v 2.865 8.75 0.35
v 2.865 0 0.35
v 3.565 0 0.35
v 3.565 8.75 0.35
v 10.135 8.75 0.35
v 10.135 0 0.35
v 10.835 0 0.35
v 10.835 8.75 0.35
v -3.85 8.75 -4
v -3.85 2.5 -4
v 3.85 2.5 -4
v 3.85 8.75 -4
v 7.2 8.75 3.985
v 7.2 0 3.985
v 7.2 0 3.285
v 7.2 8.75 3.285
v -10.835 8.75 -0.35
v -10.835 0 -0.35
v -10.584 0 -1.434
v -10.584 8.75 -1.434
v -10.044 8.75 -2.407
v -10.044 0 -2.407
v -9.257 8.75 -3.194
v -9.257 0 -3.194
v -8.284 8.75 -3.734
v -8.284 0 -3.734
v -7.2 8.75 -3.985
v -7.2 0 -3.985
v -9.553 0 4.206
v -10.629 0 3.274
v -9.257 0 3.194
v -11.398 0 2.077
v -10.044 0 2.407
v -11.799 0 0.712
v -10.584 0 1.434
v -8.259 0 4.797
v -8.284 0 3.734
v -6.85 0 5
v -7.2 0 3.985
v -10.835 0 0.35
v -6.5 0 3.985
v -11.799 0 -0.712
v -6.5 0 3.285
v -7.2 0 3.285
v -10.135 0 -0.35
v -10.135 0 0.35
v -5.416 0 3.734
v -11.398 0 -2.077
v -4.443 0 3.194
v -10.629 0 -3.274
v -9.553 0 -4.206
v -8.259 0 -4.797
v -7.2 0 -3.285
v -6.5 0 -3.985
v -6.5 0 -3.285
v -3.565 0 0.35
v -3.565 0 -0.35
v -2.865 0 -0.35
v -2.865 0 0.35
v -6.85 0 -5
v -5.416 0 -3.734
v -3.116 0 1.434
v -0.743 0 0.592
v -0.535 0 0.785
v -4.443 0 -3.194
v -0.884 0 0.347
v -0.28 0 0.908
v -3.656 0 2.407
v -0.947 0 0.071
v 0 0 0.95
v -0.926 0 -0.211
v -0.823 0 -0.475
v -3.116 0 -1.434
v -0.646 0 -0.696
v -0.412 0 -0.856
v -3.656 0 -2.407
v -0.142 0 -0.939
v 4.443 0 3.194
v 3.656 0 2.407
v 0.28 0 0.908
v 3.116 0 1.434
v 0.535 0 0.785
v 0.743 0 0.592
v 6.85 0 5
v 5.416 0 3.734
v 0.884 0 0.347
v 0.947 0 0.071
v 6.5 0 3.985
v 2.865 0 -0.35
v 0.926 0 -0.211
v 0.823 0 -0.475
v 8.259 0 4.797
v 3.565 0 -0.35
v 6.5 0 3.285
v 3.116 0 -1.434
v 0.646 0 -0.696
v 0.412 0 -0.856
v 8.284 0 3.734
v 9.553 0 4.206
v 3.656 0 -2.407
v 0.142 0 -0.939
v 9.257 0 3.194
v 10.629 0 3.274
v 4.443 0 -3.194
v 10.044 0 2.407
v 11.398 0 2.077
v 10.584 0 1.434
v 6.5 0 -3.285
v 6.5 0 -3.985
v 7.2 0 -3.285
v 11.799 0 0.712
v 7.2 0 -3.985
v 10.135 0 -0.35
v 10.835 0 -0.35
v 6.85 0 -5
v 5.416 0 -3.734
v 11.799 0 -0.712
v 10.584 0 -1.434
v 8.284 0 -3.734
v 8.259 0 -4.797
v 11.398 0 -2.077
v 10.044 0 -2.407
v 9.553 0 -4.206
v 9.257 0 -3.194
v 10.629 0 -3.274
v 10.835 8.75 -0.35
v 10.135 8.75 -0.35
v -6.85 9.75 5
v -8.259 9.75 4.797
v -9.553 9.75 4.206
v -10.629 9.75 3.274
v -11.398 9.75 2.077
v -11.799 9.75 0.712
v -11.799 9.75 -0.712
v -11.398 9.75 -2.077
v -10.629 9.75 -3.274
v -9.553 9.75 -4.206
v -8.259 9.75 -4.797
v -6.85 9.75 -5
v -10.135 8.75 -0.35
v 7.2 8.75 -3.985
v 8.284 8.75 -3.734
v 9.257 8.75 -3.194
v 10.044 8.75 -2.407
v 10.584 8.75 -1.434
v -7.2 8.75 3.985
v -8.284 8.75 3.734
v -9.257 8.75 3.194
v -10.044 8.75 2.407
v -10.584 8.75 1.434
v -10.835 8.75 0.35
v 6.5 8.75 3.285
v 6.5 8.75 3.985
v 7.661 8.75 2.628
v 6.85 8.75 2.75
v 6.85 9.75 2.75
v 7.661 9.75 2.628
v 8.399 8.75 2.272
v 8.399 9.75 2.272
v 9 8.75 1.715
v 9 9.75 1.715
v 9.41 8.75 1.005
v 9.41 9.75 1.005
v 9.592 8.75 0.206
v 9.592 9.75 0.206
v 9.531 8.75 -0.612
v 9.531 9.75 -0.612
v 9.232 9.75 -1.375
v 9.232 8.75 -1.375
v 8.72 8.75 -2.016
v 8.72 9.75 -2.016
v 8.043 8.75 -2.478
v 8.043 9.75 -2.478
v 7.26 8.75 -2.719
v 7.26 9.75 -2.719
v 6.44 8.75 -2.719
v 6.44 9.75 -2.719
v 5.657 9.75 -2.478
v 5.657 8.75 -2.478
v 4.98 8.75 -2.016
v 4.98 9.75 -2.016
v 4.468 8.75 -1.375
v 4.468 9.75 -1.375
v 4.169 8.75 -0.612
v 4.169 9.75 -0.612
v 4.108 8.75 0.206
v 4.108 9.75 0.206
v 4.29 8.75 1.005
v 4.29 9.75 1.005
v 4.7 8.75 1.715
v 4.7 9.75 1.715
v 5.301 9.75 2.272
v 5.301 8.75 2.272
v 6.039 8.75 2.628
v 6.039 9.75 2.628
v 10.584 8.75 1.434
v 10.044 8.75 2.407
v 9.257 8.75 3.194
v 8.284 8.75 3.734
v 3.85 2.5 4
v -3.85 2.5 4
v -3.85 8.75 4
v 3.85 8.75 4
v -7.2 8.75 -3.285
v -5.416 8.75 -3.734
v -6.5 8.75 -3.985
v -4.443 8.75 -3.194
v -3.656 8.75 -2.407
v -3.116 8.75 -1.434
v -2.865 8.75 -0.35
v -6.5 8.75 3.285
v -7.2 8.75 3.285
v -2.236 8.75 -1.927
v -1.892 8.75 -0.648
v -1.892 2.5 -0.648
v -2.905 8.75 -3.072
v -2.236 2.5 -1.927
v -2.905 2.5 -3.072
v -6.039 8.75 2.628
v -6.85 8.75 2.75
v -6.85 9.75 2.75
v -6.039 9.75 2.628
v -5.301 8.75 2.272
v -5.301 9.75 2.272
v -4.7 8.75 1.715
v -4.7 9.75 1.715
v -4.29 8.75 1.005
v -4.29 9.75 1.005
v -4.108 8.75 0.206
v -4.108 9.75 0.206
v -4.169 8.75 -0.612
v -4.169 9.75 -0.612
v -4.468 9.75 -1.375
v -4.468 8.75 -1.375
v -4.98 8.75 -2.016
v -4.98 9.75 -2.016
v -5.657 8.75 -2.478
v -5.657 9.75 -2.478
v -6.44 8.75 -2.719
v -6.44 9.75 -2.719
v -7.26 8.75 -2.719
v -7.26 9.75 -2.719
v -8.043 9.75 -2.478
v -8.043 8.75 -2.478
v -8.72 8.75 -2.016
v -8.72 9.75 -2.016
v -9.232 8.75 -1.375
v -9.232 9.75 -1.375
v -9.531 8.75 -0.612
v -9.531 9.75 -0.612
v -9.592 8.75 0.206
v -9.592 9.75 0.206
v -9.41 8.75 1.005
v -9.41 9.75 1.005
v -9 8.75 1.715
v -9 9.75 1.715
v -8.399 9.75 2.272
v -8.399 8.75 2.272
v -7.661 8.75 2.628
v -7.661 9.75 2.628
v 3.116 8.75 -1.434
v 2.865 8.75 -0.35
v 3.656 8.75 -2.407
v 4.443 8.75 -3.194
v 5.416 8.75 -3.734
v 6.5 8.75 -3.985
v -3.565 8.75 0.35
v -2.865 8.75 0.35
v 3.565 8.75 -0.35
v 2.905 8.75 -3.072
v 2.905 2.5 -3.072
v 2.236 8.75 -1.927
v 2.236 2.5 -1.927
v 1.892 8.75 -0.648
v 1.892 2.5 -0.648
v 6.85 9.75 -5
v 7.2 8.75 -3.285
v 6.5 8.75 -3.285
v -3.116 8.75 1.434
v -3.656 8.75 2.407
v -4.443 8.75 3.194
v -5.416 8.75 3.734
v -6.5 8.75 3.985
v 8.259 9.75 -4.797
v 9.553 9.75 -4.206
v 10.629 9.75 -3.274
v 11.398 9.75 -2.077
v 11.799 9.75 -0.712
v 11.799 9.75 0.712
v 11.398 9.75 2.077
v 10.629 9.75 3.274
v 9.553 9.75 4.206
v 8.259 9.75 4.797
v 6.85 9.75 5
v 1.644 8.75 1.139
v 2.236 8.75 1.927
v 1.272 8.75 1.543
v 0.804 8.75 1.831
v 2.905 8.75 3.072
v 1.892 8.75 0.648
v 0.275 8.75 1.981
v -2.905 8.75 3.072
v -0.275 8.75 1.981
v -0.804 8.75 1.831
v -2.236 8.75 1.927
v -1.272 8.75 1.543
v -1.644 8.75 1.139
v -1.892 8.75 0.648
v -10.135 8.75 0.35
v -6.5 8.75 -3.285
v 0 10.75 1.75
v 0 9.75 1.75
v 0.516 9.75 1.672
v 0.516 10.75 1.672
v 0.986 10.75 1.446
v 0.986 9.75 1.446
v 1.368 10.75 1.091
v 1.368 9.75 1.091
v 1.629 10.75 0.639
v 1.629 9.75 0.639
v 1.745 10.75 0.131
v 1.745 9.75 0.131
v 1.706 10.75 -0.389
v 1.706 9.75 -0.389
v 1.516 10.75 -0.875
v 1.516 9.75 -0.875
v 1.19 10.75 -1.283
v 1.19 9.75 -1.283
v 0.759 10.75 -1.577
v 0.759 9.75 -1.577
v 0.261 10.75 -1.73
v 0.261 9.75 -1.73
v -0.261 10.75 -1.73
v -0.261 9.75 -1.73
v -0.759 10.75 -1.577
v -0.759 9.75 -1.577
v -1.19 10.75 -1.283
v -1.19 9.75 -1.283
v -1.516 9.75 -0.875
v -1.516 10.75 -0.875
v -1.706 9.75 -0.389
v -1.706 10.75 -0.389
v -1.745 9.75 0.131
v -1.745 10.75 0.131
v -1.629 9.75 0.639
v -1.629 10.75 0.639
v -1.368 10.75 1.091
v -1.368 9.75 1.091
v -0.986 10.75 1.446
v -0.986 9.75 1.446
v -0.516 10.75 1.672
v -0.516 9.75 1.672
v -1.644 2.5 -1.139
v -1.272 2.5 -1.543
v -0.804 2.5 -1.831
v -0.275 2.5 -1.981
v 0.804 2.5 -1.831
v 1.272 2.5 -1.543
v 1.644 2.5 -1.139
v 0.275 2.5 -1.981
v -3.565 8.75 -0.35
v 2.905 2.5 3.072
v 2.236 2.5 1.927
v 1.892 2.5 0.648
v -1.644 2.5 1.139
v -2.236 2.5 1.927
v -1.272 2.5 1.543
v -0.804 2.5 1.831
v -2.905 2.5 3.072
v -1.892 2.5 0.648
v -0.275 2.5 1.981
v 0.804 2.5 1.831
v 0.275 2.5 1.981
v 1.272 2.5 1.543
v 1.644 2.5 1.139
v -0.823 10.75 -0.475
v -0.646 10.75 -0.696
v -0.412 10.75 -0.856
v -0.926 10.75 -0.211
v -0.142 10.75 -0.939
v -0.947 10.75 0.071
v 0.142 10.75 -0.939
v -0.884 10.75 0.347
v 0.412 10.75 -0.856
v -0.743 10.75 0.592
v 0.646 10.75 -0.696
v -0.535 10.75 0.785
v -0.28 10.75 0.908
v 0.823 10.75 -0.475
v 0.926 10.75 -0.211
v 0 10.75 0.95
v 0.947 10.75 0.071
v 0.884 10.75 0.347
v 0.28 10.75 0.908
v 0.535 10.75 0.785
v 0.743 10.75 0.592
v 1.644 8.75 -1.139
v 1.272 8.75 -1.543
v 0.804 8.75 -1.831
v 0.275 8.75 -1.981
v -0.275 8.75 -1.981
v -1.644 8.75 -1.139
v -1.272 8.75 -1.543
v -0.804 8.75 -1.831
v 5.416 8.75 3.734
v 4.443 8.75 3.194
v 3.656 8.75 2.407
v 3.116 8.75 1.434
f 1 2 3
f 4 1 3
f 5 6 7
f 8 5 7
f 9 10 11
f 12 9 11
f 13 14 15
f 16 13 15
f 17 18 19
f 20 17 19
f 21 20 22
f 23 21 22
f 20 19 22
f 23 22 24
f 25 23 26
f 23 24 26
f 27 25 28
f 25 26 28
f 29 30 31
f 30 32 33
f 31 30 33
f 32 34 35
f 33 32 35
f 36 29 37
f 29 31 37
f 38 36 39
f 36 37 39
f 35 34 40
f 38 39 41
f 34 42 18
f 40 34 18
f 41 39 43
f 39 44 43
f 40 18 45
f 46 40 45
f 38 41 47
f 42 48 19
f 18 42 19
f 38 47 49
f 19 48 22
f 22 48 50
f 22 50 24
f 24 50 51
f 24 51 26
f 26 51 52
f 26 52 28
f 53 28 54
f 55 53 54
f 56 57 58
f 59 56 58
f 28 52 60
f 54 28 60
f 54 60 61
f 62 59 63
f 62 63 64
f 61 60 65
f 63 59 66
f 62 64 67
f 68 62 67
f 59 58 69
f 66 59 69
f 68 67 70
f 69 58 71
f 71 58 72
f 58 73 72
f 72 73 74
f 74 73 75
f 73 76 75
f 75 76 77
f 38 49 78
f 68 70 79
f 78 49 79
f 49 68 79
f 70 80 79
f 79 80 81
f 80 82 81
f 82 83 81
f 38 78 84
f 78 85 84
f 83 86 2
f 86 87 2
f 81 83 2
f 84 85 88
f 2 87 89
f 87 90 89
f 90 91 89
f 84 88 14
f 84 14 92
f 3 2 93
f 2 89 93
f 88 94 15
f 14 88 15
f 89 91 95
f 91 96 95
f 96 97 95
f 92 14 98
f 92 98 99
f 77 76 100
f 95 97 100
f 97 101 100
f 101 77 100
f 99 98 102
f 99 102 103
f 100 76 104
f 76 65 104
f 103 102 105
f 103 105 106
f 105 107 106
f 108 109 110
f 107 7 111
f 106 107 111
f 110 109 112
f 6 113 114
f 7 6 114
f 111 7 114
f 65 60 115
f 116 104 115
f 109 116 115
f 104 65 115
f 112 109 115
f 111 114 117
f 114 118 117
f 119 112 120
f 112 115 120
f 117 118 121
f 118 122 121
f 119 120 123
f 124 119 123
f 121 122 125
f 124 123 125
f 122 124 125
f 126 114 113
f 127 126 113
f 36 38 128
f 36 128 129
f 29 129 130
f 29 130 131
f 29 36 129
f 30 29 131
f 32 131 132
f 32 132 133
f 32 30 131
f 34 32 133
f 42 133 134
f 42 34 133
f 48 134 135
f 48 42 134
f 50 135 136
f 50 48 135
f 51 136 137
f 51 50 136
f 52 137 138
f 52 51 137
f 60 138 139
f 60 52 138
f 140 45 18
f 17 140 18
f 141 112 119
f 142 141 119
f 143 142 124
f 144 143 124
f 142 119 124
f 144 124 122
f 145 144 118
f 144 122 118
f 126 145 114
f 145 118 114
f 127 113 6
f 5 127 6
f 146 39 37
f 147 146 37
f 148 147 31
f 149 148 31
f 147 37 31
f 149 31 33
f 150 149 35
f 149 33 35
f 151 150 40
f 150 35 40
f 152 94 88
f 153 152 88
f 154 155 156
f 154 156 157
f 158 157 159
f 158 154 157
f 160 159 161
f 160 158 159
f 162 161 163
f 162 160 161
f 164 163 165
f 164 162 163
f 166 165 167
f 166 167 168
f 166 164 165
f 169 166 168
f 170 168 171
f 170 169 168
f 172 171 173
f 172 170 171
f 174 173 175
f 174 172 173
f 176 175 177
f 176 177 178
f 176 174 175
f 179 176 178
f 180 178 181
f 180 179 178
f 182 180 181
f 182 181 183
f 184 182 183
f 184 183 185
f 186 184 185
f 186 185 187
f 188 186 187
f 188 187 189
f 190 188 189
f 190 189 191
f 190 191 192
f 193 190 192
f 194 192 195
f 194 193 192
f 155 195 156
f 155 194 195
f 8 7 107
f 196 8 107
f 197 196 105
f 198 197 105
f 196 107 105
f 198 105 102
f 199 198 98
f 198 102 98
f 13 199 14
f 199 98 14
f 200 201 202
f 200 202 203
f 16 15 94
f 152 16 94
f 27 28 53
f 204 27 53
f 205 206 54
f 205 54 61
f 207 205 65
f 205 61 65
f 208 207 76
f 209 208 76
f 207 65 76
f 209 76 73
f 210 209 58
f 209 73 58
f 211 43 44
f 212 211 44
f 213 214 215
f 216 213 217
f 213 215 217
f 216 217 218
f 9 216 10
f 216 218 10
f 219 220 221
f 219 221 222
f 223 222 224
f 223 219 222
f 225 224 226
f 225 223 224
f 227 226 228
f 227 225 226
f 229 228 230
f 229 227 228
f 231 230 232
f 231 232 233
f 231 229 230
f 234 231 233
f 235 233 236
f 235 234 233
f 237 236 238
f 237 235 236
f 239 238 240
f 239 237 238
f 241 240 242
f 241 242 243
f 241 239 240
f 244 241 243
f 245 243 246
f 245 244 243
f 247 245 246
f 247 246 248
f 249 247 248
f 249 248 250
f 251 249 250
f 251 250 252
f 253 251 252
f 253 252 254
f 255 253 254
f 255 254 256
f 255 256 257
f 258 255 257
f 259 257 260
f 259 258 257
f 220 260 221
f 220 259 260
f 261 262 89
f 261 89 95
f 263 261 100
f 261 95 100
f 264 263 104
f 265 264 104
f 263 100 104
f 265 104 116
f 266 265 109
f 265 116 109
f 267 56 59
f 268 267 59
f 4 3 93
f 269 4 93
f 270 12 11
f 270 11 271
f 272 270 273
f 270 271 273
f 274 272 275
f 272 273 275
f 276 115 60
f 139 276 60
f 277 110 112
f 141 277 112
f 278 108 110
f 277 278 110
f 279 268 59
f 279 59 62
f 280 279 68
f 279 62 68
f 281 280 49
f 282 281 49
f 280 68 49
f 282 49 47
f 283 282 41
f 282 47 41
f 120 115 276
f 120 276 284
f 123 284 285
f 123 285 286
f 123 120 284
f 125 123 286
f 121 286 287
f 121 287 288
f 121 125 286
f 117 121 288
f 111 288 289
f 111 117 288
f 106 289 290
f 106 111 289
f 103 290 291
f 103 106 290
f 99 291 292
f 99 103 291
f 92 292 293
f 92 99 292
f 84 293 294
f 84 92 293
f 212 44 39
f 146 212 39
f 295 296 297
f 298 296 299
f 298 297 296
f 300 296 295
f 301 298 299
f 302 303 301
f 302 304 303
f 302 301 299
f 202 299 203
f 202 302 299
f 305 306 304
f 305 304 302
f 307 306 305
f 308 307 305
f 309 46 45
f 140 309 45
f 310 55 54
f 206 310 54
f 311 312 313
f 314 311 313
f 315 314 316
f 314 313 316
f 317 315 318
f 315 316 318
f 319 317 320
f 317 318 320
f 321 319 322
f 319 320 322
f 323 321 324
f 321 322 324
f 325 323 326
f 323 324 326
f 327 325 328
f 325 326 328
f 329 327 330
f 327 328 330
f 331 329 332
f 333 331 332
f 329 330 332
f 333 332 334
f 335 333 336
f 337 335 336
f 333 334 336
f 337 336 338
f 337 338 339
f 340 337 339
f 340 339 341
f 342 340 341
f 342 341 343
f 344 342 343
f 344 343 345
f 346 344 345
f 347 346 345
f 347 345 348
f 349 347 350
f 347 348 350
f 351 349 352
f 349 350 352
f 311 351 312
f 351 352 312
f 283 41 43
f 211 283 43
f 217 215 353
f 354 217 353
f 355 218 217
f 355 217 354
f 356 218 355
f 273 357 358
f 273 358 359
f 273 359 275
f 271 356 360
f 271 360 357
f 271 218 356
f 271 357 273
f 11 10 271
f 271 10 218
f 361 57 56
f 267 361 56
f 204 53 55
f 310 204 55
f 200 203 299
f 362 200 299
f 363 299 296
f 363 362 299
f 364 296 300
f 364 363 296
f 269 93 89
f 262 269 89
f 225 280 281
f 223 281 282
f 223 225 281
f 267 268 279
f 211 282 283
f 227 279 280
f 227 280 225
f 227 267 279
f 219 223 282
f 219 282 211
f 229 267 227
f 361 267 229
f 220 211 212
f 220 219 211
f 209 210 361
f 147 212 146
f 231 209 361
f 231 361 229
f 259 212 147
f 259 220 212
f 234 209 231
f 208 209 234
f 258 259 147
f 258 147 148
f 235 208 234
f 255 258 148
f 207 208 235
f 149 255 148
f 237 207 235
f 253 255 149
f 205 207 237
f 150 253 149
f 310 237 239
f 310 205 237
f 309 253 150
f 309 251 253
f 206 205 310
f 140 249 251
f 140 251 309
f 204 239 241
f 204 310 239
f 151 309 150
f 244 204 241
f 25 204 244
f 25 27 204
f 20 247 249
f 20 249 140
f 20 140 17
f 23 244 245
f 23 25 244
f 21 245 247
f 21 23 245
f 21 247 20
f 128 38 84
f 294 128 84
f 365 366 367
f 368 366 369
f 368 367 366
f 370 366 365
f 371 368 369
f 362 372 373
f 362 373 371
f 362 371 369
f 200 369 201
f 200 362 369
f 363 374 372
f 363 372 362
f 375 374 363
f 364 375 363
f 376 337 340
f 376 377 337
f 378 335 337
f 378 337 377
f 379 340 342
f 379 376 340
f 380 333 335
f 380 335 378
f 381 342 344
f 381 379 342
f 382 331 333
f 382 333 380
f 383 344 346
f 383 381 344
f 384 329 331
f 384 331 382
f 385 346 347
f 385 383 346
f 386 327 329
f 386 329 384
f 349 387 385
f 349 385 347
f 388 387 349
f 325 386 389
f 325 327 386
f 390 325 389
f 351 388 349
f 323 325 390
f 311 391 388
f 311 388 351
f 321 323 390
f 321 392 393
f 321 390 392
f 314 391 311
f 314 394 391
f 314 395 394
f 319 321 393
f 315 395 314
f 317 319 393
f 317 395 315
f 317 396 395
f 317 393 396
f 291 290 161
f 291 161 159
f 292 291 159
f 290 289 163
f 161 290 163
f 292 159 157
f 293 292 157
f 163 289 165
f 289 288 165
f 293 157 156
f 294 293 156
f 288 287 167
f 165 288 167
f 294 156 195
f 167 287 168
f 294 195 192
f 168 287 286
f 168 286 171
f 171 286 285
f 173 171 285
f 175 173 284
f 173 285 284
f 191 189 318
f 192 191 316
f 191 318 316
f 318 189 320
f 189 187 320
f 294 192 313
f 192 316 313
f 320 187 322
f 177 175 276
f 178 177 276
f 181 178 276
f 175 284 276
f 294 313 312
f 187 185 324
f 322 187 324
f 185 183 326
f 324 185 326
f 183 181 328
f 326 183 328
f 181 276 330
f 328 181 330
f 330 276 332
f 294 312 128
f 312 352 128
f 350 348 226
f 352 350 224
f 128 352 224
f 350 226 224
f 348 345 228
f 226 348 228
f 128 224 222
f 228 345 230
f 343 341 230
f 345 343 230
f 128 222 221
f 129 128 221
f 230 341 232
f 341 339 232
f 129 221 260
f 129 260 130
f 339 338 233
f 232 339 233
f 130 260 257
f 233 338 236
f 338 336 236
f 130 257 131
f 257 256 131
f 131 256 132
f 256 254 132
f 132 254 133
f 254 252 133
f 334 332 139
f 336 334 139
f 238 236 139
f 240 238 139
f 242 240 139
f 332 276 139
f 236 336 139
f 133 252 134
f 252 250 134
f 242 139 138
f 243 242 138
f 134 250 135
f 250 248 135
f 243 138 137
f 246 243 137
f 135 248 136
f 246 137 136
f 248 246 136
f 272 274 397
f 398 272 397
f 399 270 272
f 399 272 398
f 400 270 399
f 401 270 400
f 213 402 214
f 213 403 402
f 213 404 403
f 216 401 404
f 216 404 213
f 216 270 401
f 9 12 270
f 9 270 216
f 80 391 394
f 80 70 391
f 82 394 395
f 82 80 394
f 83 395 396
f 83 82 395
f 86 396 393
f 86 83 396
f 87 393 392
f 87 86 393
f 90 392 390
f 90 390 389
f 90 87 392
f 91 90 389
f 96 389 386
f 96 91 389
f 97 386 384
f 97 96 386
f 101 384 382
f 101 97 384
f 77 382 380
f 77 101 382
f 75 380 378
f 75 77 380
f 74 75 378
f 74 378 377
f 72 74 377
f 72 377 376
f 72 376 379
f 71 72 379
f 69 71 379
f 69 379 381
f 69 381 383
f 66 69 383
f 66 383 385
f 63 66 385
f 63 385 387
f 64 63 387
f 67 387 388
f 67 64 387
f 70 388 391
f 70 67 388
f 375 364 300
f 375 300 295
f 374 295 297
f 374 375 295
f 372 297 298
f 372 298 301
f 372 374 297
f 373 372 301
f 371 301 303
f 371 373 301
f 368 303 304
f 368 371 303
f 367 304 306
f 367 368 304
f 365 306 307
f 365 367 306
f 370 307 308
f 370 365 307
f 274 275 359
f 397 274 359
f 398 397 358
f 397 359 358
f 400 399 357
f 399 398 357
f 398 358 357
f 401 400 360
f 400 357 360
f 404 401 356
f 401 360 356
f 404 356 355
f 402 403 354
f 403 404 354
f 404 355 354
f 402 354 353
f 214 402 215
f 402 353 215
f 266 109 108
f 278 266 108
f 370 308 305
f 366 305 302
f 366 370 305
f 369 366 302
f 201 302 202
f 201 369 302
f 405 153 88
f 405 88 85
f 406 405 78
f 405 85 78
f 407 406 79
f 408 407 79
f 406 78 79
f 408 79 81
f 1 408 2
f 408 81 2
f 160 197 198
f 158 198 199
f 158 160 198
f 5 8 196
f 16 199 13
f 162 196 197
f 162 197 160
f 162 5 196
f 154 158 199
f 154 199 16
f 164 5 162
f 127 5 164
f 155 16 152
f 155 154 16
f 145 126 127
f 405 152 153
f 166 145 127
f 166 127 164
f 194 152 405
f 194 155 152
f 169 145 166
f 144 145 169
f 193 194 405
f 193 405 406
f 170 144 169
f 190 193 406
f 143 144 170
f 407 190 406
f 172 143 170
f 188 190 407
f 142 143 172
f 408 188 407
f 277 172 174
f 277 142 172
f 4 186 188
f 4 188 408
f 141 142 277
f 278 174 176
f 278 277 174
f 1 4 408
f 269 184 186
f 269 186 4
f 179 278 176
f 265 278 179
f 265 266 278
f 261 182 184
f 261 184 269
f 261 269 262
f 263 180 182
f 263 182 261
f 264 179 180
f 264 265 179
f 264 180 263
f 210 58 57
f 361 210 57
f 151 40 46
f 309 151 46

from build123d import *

# Parameters (mm, degrees)
SKETCH1_R           = 0.95
BOSS_EXTRUDE1_DEPTH = 2.5
SKETCH2_R           = 0.95
BOSS_EXTRUDE2_DEPTH = 9.75
BOSS_EXTRUDE3_START = -1
SKETCH3_R           = 0.95
SKETCH3_R_2         = 2.75
BOSS_EXTRUDE3_DEPTH = 1
SKETCH4_R           = 1.75
SKETCH4_R_2         = 0.95
BOSS_EXTRUDE4_DEPTH = 1


with BuildPart() as part:
    # Sketch1 → Boss-Extrude1 (new body)
    with BuildSketch(Plane(origin=(0, 0, 0), x_dir=(1, 0, 0), z_dir=(0, 1, 0))):
        with BuildLine():
            Line((6.85, 5), (2.25, 5))
            Line((2.25, 5), (-2.25, 5))
            Line((-2.25, 5), (-6.85, 5))
            ThreePointArc((-6.85, 5), (-1.85, 0), (-6.85, -5))
            Line((-6.85, -5), (-2.35, -5))
            Line((-2.35, -5), (2.35, -5))
            Line((2.35, -5), (6.85, -5))
            ThreePointArc((6.85, -5), (1.85, 0), (6.85, 5))
        make_face()
        with Locations(Location((0, 0, 0), (0, 0, 270))):
            Circle(SKETCH1_R, mode=Mode.SUBTRACT)
    extrude(amount=BOSS_EXTRUDE1_DEPTH)

    # Sketch2 → Boss-Extrude2 (add)
    with BuildSketch(Plane(origin=(0, 0, 0), x_dir=(1, 0, 0), z_dir=(0, 1, 0))):
        with BuildLine():
            Line((-6.85, 5), (6.85, 5))
            ThreePointArc((6.85, 5), (11.85, 0), (6.85, -5))
            Line((6.85, -5), (-6.85, -5))
            ThreePointArc((-6.85, -5), (-11.85, 0), (-6.85, 5))
        make_face()
        with Locations(Location((0, 0, 0), (0, 0, 270))):
            Circle(SKETCH2_R, mode=Mode.SUBTRACT)
        with BuildLine():
            Line((-7.2, 3.984658078), (-7.2, 3.284658078))
            Line((-7.2, 3.284658078), (-6.5, 3.284658078))
            Line((-6.5, 3.284658078), (-6.5, 3.984658078))
            ThreePointArc((-6.5, 3.984658078), (-4.021572875, 2.828427125), (-2.865341922, 0.35))
            Line((-2.865341922, 0.35), (-3.565341922, 0.35))
            Line((-3.565341922, 0.35), (-3.565341922, -0.35))
            Line((-3.565341922, -0.35), (-2.865341922, -0.35))
            ThreePointArc((-2.865341922, -0.35), (-4.021572875, -2.828427125), (-6.5, -3.984658078))
            Line((-6.5, -3.984658078), (-6.5, -3.284658078))
            Line((-6.5, -3.284658078), (-7.2, -3.284658078))
            Line((-7.2, -3.284658078), (-7.2, -3.984658078))
            ThreePointArc((-7.2, -3.984658078), (-9.678427125, -2.828427125), (-10.834658078, -0.35))
            Line((-10.834658078, -0.35), (-10.134658078, -0.35))
            Line((-10.134658078, -0.35), (-10.134658078, 0.35))
            Line((-10.134658078, 0.35), (-10.834658078, 0.35))
            ThreePointArc((-10.834658078, 0.35), (-9.678427125, 2.828427125), (-7.2, 3.984658078))
        make_face(mode=Mode.SUBTRACT)
        with BuildLine():
            Line((-3.85, 4), (3.85, 4))
            ThreePointArc((3.85, 4), (2.532477728, 2.521706056), (1.892153285, 0.647885752))
            ThreePointArc((1.892153285, 0.647885752), (0, 2), (-1.892153285, 0.647885752))
            ThreePointArc((-1.892153285, 0.647885752), (-2.532477728, 2.521706056), (-3.85, 4))
        make_face(mode=Mode.SUBTRACT)
        with BuildLine():
            Line((-3.85, -4), (3.85, -4))
            ThreePointArc((3.85, -4), (2.532477728, -2.521706056), (1.892153285, -0.647885752))
            ThreePointArc((1.892153285, -0.647885752), (0, -2), (-1.892153285, -0.647885752))
            ThreePointArc((-1.892153285, -0.647885752), (-2.532477728, -2.521706056), (-3.85, -4))
        make_face(mode=Mode.SUBTRACT)
        with BuildLine():
            Line((6.5, 3.984658078), (6.5, 3.284658078))
            Line((6.5, 3.284658078), (7.2, 3.284658078))
            Line((7.2, 3.284658078), (7.2, 3.984658078))
            ThreePointArc((7.2, 3.984658078), (9.678427125, 2.828427125), (10.834658078, 0.35))
            Line((10.834658078, 0.35), (10.134658078, 0.35))
            Line((10.134658078, 0.35), (10.134658078, -0.35))
            Line((10.134658078, -0.35), (10.834658078, -0.35))
            ThreePointArc((10.834658078, -0.35), (9.678427125, -2.828427125), (7.2, -3.984658078))
            Line((7.2, -3.984658078), (7.2, -3.284658078))
            Line((7.2, -3.284658078), (6.5, -3.284658078))
            Line((6.5, -3.284658078), (6.5, -3.984658078))
            ThreePointArc((6.5, -3.984658078), (4.021572875, -2.828427125), (2.865341922, -0.35))
            Line((2.865341922, -0.35), (3.565341922, -0.35))
            Line((3.565341922, -0.35), (3.565341922, 0.35))
            Line((3.565341922, 0.35), (2.865341922, 0.35))
            ThreePointArc((2.865341922, 0.35), (4.021572875, 2.828427125), (6.5, 3.984658078))
        make_face(mode=Mode.SUBTRACT)
    extrude(amount=BOSS_EXTRUDE2_DEPTH)

    # Sketch3 → Boss-Extrude3 (add)
    with BuildSketch(Plane(origin=(0, 9.75, 0), x_dir=(1, 0, 0), z_dir=(0, 1, 0)).offset(BOSS_EXTRUDE3_START)):
        with BuildLine():
            Line((-6.85, 5), (6.85, 5))
            ThreePointArc((6.85, 5), (11.85, 0), (6.85, -5))
            Line((6.85, -5), (-6.85, -5))
            ThreePointArc((-6.85, -5), (-11.85, 0), (-6.85, 5))
        make_face()
        with Locations(Location((0, 0, 0), (0, 0, 270))):
            Circle(SKETCH3_R, mode=Mode.SUBTRACT)
        with Locations(Location((-6.85, 0, 0), (0, 0, 270))):
            Circle(SKETCH3_R_2, mode=Mode.SUBTRACT)
        with Locations(Location((6.85, 0, 0), (0, 0, 270))):
            Circle(SKETCH3_R_2, mode=Mode.SUBTRACT)
    extrude(amount=BOSS_EXTRUDE3_DEPTH)

    # Sketch4 → Boss-Extrude4 (add)
    with BuildSketch(Plane(origin=(0, 9.75, 0), x_dir=(1, 0, 0), z_dir=(0, 1, 0))):
        with Locations(Location((0, 0, 0), (0, 0, 270))):
            Circle(SKETCH4_R)
        with Locations(Location((0, 0, 0), (0, 0, 270))):
            Circle(SKETCH4_R_2, mode=Mode.SUBTRACT)
    extrude(amount=BOSS_EXTRUDE4_DEPTH)


solid = part.part
